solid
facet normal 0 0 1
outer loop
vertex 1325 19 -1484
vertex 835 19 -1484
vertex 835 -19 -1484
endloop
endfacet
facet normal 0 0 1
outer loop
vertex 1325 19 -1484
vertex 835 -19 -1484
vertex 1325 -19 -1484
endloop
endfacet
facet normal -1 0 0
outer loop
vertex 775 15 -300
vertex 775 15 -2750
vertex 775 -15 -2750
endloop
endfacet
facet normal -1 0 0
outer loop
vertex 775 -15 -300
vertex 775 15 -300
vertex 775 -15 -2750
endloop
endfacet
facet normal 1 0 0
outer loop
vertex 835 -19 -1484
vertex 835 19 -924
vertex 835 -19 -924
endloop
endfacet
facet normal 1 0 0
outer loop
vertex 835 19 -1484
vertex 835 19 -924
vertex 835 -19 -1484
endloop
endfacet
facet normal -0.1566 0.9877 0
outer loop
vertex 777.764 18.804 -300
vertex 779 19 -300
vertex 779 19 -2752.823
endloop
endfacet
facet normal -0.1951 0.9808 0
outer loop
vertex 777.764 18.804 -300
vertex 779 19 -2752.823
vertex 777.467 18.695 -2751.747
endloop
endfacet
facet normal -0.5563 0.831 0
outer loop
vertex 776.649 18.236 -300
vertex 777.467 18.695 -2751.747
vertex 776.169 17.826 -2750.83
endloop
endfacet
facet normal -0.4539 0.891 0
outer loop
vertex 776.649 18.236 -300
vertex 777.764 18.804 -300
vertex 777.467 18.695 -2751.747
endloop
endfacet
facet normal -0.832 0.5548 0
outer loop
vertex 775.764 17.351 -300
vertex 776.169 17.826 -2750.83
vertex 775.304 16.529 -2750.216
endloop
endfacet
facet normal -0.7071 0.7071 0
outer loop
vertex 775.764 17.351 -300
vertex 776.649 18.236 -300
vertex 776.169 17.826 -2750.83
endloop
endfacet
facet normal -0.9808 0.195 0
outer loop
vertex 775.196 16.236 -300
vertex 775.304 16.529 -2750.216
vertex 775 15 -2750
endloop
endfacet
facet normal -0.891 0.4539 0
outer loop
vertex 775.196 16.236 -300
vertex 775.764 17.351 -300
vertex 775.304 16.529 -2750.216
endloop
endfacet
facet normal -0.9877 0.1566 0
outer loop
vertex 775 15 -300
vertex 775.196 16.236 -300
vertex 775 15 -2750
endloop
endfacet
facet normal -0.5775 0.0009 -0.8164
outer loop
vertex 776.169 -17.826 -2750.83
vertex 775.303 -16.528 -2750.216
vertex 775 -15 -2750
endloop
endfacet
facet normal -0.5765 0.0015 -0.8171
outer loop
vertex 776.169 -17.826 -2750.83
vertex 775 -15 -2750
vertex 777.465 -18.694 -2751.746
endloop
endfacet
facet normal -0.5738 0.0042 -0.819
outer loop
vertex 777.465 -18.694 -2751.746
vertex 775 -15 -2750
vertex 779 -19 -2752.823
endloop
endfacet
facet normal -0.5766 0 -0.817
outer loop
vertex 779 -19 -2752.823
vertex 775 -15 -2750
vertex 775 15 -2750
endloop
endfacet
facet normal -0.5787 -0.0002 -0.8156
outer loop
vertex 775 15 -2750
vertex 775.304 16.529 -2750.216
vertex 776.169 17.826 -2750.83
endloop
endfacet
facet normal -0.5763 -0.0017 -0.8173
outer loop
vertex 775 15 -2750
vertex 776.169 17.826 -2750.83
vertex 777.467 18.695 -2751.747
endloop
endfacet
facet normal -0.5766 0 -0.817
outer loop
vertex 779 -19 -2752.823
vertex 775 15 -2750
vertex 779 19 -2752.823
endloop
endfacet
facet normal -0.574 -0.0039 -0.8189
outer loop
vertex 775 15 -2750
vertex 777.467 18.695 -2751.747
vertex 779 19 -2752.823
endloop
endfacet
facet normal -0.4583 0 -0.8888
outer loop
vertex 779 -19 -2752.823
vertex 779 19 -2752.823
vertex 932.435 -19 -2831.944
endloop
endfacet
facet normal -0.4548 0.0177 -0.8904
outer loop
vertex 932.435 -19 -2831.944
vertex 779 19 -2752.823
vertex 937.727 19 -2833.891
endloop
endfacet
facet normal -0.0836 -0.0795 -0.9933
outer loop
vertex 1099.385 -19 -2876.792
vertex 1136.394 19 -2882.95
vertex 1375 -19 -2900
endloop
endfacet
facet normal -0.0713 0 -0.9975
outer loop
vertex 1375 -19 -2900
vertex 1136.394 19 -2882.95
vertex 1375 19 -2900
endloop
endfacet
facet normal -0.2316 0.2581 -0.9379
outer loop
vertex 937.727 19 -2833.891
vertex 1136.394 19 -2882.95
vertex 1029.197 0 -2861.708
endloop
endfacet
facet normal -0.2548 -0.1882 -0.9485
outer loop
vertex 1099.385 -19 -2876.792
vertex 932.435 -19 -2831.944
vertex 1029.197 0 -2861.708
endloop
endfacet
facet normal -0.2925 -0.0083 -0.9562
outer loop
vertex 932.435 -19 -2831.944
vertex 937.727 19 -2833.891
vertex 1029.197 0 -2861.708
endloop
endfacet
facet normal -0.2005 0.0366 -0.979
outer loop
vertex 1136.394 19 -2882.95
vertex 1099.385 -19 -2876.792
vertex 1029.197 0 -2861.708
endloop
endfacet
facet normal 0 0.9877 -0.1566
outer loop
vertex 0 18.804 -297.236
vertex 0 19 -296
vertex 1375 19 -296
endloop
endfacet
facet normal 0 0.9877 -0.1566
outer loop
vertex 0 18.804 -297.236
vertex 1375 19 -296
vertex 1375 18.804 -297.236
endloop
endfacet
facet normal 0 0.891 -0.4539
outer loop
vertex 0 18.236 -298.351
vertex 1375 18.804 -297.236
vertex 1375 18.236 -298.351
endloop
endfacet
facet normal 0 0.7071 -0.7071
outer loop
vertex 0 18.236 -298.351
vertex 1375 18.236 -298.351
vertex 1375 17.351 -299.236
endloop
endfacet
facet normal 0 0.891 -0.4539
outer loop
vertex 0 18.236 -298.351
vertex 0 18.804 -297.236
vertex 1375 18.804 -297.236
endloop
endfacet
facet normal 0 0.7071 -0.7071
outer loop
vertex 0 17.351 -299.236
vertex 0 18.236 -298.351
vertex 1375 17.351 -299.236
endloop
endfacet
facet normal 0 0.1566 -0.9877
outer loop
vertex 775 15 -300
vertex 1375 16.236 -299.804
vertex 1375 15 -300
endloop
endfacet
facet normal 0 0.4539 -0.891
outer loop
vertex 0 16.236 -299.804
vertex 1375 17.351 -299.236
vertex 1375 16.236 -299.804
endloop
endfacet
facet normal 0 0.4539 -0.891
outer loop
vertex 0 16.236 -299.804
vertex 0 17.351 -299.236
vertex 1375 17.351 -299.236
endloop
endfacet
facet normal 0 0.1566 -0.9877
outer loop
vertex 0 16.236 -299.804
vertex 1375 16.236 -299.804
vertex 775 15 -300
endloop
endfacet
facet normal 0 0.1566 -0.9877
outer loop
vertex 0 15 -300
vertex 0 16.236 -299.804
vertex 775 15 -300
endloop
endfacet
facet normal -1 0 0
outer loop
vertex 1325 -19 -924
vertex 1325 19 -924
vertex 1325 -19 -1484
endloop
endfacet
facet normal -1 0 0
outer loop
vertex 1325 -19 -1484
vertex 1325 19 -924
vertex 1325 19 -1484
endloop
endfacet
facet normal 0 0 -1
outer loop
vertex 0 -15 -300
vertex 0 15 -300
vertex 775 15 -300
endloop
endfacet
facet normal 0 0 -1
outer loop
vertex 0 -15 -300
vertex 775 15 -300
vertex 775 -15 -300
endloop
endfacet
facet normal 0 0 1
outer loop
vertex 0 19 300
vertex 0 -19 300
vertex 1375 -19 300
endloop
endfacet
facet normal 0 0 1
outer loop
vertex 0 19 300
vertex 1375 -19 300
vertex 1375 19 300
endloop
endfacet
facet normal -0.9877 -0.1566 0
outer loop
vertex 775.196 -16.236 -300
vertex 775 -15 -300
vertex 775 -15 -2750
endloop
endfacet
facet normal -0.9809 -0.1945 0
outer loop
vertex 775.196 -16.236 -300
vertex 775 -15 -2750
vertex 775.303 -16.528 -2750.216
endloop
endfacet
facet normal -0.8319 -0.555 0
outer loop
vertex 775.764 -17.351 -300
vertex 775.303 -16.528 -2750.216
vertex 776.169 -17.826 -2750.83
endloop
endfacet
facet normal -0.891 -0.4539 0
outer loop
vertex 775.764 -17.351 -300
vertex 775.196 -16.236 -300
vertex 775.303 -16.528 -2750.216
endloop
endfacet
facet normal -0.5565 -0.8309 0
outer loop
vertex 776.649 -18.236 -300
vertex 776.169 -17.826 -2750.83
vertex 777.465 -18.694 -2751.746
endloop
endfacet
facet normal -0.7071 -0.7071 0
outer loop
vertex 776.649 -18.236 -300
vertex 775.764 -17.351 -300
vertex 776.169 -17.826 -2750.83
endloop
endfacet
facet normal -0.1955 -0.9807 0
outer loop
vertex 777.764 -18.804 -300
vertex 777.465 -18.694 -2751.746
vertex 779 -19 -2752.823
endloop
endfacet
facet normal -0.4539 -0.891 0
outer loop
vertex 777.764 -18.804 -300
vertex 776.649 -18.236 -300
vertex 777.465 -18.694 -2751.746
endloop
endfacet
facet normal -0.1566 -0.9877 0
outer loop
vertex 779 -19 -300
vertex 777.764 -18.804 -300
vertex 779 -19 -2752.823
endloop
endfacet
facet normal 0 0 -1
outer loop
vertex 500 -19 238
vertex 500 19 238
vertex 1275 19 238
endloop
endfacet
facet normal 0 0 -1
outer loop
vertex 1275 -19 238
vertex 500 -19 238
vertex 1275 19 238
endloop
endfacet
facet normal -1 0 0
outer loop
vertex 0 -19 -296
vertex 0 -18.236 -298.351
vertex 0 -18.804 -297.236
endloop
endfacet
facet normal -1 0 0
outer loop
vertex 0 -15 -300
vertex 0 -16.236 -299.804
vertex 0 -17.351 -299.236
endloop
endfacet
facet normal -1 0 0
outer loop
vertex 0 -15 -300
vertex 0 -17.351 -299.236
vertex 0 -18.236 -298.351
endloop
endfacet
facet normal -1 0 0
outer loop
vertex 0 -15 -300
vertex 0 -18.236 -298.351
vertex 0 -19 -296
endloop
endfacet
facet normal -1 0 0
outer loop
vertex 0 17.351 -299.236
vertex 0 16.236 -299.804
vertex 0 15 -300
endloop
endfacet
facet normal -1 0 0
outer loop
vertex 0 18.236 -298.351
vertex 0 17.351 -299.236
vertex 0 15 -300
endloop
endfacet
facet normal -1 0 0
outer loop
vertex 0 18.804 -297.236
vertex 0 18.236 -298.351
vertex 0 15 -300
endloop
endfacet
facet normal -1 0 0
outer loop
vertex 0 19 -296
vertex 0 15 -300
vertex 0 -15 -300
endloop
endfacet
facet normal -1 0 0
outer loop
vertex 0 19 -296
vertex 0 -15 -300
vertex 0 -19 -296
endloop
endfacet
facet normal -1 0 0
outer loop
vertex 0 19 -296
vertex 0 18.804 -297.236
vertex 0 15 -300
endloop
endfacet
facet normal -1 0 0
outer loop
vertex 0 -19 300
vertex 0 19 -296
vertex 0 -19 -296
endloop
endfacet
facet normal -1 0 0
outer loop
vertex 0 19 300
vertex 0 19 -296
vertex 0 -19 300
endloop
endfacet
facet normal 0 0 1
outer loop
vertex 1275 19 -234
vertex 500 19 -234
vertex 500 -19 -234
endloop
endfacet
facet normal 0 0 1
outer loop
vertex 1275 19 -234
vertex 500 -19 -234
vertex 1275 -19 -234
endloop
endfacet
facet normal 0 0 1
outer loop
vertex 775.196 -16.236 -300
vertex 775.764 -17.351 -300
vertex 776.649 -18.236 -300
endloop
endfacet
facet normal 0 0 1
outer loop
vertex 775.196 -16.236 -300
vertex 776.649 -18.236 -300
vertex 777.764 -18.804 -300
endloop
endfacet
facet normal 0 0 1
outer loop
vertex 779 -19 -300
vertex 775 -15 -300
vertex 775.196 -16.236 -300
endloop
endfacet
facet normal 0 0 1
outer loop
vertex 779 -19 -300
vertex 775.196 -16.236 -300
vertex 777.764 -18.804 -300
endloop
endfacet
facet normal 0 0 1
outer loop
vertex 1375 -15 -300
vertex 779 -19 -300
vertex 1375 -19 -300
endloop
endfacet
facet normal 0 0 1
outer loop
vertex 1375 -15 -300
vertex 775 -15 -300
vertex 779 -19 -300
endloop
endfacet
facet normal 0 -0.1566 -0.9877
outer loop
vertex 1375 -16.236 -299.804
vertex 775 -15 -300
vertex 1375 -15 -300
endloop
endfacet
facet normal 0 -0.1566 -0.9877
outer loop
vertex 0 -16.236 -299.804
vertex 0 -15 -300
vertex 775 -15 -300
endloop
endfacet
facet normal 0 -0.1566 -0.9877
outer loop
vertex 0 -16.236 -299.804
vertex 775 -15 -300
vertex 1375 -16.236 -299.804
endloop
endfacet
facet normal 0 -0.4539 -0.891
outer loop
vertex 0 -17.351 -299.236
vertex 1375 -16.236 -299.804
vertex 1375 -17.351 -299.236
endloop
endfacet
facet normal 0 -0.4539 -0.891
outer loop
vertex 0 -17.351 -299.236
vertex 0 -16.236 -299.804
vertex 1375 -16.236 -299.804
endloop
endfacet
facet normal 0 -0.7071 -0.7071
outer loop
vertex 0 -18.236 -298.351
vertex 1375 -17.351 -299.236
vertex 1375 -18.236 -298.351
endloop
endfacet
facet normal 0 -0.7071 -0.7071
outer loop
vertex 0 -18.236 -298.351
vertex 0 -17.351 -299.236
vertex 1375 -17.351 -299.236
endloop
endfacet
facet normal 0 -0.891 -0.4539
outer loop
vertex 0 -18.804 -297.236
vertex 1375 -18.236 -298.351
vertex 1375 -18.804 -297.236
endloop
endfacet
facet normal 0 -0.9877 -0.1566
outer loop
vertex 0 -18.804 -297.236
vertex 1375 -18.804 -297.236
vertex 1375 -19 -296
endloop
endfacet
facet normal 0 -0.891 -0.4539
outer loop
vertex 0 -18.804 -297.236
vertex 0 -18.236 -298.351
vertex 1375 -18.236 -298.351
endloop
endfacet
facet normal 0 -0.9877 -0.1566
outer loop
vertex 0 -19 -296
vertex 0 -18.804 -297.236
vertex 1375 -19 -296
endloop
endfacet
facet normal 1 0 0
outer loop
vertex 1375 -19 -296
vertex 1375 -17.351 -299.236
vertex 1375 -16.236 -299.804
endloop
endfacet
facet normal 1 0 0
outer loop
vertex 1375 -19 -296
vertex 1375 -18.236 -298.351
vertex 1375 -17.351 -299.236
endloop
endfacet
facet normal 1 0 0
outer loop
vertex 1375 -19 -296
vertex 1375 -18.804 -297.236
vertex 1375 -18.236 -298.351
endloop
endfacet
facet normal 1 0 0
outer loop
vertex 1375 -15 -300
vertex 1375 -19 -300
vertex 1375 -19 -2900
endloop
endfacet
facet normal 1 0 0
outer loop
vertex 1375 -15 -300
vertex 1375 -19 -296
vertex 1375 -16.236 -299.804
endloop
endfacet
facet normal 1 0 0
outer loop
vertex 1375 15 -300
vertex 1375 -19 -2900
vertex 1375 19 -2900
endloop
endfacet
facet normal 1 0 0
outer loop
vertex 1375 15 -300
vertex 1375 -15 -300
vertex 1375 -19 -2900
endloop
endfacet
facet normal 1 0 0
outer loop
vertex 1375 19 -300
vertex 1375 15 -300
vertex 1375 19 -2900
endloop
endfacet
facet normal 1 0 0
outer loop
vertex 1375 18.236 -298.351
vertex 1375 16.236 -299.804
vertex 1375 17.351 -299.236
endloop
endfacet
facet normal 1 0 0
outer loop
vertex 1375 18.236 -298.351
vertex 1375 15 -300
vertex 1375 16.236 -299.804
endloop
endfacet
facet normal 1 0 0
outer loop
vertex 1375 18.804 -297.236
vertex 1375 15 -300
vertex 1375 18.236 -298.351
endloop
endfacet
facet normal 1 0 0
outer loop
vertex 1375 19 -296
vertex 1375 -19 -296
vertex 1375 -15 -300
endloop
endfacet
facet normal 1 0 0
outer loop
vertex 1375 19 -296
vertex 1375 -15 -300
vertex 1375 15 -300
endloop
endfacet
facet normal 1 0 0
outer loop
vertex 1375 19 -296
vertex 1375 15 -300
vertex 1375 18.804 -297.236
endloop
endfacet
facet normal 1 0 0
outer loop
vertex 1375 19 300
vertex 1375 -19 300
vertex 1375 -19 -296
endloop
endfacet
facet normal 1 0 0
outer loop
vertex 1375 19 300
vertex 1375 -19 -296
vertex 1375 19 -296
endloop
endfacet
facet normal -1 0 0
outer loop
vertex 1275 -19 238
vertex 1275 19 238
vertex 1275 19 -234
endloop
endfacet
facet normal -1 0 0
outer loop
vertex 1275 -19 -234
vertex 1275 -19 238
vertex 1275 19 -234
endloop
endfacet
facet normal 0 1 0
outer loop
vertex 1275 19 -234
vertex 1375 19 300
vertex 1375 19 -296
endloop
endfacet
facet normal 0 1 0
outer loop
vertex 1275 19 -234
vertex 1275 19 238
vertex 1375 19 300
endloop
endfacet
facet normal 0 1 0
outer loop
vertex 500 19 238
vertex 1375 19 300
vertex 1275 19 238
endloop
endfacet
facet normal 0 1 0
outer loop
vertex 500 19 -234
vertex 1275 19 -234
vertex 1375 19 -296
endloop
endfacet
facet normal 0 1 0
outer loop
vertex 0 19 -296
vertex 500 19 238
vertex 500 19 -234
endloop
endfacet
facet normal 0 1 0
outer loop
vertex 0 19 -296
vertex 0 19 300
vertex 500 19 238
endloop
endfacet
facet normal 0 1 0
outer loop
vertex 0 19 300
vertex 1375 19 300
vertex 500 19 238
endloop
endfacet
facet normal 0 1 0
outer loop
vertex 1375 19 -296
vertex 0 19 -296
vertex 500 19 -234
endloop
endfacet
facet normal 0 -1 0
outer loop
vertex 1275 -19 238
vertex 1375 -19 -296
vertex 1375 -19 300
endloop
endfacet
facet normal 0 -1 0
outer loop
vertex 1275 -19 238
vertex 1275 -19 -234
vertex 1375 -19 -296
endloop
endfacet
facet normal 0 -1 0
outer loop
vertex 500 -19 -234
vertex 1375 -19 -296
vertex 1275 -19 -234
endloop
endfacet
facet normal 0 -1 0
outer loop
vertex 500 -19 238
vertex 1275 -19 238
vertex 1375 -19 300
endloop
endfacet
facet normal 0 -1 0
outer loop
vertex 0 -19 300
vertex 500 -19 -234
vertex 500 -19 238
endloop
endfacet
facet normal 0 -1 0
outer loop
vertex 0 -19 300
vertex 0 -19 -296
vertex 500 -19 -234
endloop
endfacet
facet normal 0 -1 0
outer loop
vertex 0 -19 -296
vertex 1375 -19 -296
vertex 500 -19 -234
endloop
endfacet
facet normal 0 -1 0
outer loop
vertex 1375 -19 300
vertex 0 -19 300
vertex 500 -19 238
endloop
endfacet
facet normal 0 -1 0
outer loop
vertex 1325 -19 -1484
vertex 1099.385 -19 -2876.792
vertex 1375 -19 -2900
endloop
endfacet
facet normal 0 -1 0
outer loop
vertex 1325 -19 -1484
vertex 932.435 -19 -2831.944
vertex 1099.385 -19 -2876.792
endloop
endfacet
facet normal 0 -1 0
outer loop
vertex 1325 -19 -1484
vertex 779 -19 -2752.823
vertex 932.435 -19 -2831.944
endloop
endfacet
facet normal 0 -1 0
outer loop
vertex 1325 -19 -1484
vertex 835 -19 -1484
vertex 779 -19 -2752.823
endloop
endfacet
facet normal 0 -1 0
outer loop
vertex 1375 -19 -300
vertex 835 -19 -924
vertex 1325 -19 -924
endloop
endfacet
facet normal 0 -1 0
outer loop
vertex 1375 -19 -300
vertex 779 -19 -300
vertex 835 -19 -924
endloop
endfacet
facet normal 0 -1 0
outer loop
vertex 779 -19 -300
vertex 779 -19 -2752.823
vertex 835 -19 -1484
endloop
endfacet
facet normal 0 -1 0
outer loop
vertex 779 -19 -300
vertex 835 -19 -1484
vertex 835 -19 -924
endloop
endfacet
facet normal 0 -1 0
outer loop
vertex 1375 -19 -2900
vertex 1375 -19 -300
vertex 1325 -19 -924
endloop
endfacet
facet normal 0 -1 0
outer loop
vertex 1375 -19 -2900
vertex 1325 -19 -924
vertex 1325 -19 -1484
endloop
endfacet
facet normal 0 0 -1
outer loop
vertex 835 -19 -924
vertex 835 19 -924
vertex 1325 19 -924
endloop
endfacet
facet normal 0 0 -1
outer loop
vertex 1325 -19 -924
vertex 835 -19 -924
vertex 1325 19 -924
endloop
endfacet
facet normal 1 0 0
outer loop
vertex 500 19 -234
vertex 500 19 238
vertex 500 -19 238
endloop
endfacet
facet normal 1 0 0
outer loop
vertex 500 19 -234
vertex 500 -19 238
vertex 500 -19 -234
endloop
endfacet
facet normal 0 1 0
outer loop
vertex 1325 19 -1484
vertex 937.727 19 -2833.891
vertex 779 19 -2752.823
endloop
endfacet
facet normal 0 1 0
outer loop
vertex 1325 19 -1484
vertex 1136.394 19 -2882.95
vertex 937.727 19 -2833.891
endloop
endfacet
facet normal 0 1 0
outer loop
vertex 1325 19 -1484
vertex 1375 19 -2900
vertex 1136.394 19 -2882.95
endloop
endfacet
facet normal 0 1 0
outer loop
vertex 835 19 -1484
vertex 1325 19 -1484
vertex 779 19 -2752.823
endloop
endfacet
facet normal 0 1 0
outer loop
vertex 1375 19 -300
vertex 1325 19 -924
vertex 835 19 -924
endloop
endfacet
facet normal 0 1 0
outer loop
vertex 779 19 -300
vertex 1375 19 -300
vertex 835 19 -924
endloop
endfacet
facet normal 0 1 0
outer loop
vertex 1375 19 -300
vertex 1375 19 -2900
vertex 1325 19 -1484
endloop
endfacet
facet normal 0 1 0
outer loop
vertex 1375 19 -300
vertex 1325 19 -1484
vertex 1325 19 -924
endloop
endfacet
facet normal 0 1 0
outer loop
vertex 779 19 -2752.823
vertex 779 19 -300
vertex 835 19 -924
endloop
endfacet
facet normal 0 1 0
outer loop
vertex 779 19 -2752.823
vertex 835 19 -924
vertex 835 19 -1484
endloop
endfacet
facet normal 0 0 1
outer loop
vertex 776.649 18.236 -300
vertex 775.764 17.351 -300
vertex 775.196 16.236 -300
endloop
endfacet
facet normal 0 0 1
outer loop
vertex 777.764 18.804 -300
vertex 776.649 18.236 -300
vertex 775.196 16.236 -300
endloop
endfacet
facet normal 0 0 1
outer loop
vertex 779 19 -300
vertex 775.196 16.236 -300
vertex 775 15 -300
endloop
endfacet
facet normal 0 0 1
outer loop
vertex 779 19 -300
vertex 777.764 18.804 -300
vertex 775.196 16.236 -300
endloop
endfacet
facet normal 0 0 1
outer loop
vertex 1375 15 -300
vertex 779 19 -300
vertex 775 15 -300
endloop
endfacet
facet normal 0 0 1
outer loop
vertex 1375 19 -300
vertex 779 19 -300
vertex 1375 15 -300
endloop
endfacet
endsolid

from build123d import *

# Parameters (mm, degrees)
BOSS_EXTRUDE1_DEPTH = 1375
BOSS_EXTRUDE2_DEPTH = 2600
SKETCH4_W           = 775
SKETCH4_H           = 472
SINK_DEPTH          = 39
SKETCH5_W           = 490
SKETCH5_H           = 560
PANEL_DEPTH         = 39
CUT_EXTRUDE2_DEPTH  = 39


with BuildPart() as part:
    # Sketch2 → Boss-Extrude1 (new body)
    with BuildSketch(Plane(origin=(0, 0, 0), x_dir=(0, 0, -1), z_dir=(1, 0, 0))):
        with BuildLine():
            Line((296, -19), (-300, -19))
            Line((-300, -19), (-300, 19))
            Line((-300, 19), (296, 19))
            ThreePointArc((296, 19), (298.828427125, 17.828427125), (300, 15))
            Line((300, 15), (300, -15))
            ThreePointArc((300, -15), (298.828427125, -17.828427125), (296, -19))
        make_face()
    extrude(amount=BOSS_EXTRUDE1_DEPTH)

    # Sketch3 → Boss-Extrude2 (add)
    with BuildSketch(Plane(origin=(0, 0, -300), x_dir=(-1, 0, 0), z_dir=(0, 0, -1))):
        with BuildLine():
            Line((-1375, 19), (-779, 19))
            ThreePointArc((-779, 19), (-776.171572875, 17.828427125), (-775, 15))
            Line((-775, 15), (-775, -15))
            ThreePointArc((-775, -15), (-776.171572875, -17.828427125), (-779, -19))
            Line((-779, -19), (-1375, -19))
            Line((-1375, -19), (-1375, 19))
        make_face()
    extrude(amount=BOSS_EXTRUDE2_DEPTH)

    # Sketch4 → sink (cut, through all)
    with BuildSketch(Plane(origin=(0, 19, 0), x_dir=(1, 0, 0), z_dir=(0, 1, 0))):
        with Locations((887.5, -2)):
            Rectangle(SKETCH4_W, SKETCH4_H)
    extrude(amount=-SINK_DEPTH, mode=Mode.SUBTRACT)

    # Sketch5 → panel (cut, through all)
    with BuildSketch(Plane(origin=(0, 19, 0), x_dir=(1, 0, 0), z_dir=(0, 1, 0))):
        with Locations((1080, 1204)):
            Rectangle(SKETCH5_W, SKETCH5_H)
    extrude(amount=-PANEL_DEPTH, mode=Mode.SUBTRACT)

    # Sketch7 → Cut-Extrude2 (cut, through all)
    with BuildSketch(Plane(origin=(0, 19, 0), x_dir=(1, 0, 0), z_dir=(0, 1, 0))):
        with BuildLine():
            Line((775, 2750), (581.090205062, 2808.629512904))
            Line((581.090205062, 2808.629512904), (669.529135366, 3022.428480339))
            Line((669.529135366, 3022.428480339), (1128.037764323, 3045.611500904))
            Line((1128.037764323, 3045.611500904), (1325.322294603, 3055.586561424))
            Line((1325.322294603, 3055.586561424), (1375, 2900))
            add(Edge.make_bspline(
                [(775, 2750), (983.393090417, 2898.416607851), (1375, 2900)],
                knots=[0, 0, 0, 1, 1, 1], degree=2))
        make_face()
    extrude(amount=-CUT_EXTRUDE2_DEPTH, mode=Mode.SUBTRACT)


solid = part.part
